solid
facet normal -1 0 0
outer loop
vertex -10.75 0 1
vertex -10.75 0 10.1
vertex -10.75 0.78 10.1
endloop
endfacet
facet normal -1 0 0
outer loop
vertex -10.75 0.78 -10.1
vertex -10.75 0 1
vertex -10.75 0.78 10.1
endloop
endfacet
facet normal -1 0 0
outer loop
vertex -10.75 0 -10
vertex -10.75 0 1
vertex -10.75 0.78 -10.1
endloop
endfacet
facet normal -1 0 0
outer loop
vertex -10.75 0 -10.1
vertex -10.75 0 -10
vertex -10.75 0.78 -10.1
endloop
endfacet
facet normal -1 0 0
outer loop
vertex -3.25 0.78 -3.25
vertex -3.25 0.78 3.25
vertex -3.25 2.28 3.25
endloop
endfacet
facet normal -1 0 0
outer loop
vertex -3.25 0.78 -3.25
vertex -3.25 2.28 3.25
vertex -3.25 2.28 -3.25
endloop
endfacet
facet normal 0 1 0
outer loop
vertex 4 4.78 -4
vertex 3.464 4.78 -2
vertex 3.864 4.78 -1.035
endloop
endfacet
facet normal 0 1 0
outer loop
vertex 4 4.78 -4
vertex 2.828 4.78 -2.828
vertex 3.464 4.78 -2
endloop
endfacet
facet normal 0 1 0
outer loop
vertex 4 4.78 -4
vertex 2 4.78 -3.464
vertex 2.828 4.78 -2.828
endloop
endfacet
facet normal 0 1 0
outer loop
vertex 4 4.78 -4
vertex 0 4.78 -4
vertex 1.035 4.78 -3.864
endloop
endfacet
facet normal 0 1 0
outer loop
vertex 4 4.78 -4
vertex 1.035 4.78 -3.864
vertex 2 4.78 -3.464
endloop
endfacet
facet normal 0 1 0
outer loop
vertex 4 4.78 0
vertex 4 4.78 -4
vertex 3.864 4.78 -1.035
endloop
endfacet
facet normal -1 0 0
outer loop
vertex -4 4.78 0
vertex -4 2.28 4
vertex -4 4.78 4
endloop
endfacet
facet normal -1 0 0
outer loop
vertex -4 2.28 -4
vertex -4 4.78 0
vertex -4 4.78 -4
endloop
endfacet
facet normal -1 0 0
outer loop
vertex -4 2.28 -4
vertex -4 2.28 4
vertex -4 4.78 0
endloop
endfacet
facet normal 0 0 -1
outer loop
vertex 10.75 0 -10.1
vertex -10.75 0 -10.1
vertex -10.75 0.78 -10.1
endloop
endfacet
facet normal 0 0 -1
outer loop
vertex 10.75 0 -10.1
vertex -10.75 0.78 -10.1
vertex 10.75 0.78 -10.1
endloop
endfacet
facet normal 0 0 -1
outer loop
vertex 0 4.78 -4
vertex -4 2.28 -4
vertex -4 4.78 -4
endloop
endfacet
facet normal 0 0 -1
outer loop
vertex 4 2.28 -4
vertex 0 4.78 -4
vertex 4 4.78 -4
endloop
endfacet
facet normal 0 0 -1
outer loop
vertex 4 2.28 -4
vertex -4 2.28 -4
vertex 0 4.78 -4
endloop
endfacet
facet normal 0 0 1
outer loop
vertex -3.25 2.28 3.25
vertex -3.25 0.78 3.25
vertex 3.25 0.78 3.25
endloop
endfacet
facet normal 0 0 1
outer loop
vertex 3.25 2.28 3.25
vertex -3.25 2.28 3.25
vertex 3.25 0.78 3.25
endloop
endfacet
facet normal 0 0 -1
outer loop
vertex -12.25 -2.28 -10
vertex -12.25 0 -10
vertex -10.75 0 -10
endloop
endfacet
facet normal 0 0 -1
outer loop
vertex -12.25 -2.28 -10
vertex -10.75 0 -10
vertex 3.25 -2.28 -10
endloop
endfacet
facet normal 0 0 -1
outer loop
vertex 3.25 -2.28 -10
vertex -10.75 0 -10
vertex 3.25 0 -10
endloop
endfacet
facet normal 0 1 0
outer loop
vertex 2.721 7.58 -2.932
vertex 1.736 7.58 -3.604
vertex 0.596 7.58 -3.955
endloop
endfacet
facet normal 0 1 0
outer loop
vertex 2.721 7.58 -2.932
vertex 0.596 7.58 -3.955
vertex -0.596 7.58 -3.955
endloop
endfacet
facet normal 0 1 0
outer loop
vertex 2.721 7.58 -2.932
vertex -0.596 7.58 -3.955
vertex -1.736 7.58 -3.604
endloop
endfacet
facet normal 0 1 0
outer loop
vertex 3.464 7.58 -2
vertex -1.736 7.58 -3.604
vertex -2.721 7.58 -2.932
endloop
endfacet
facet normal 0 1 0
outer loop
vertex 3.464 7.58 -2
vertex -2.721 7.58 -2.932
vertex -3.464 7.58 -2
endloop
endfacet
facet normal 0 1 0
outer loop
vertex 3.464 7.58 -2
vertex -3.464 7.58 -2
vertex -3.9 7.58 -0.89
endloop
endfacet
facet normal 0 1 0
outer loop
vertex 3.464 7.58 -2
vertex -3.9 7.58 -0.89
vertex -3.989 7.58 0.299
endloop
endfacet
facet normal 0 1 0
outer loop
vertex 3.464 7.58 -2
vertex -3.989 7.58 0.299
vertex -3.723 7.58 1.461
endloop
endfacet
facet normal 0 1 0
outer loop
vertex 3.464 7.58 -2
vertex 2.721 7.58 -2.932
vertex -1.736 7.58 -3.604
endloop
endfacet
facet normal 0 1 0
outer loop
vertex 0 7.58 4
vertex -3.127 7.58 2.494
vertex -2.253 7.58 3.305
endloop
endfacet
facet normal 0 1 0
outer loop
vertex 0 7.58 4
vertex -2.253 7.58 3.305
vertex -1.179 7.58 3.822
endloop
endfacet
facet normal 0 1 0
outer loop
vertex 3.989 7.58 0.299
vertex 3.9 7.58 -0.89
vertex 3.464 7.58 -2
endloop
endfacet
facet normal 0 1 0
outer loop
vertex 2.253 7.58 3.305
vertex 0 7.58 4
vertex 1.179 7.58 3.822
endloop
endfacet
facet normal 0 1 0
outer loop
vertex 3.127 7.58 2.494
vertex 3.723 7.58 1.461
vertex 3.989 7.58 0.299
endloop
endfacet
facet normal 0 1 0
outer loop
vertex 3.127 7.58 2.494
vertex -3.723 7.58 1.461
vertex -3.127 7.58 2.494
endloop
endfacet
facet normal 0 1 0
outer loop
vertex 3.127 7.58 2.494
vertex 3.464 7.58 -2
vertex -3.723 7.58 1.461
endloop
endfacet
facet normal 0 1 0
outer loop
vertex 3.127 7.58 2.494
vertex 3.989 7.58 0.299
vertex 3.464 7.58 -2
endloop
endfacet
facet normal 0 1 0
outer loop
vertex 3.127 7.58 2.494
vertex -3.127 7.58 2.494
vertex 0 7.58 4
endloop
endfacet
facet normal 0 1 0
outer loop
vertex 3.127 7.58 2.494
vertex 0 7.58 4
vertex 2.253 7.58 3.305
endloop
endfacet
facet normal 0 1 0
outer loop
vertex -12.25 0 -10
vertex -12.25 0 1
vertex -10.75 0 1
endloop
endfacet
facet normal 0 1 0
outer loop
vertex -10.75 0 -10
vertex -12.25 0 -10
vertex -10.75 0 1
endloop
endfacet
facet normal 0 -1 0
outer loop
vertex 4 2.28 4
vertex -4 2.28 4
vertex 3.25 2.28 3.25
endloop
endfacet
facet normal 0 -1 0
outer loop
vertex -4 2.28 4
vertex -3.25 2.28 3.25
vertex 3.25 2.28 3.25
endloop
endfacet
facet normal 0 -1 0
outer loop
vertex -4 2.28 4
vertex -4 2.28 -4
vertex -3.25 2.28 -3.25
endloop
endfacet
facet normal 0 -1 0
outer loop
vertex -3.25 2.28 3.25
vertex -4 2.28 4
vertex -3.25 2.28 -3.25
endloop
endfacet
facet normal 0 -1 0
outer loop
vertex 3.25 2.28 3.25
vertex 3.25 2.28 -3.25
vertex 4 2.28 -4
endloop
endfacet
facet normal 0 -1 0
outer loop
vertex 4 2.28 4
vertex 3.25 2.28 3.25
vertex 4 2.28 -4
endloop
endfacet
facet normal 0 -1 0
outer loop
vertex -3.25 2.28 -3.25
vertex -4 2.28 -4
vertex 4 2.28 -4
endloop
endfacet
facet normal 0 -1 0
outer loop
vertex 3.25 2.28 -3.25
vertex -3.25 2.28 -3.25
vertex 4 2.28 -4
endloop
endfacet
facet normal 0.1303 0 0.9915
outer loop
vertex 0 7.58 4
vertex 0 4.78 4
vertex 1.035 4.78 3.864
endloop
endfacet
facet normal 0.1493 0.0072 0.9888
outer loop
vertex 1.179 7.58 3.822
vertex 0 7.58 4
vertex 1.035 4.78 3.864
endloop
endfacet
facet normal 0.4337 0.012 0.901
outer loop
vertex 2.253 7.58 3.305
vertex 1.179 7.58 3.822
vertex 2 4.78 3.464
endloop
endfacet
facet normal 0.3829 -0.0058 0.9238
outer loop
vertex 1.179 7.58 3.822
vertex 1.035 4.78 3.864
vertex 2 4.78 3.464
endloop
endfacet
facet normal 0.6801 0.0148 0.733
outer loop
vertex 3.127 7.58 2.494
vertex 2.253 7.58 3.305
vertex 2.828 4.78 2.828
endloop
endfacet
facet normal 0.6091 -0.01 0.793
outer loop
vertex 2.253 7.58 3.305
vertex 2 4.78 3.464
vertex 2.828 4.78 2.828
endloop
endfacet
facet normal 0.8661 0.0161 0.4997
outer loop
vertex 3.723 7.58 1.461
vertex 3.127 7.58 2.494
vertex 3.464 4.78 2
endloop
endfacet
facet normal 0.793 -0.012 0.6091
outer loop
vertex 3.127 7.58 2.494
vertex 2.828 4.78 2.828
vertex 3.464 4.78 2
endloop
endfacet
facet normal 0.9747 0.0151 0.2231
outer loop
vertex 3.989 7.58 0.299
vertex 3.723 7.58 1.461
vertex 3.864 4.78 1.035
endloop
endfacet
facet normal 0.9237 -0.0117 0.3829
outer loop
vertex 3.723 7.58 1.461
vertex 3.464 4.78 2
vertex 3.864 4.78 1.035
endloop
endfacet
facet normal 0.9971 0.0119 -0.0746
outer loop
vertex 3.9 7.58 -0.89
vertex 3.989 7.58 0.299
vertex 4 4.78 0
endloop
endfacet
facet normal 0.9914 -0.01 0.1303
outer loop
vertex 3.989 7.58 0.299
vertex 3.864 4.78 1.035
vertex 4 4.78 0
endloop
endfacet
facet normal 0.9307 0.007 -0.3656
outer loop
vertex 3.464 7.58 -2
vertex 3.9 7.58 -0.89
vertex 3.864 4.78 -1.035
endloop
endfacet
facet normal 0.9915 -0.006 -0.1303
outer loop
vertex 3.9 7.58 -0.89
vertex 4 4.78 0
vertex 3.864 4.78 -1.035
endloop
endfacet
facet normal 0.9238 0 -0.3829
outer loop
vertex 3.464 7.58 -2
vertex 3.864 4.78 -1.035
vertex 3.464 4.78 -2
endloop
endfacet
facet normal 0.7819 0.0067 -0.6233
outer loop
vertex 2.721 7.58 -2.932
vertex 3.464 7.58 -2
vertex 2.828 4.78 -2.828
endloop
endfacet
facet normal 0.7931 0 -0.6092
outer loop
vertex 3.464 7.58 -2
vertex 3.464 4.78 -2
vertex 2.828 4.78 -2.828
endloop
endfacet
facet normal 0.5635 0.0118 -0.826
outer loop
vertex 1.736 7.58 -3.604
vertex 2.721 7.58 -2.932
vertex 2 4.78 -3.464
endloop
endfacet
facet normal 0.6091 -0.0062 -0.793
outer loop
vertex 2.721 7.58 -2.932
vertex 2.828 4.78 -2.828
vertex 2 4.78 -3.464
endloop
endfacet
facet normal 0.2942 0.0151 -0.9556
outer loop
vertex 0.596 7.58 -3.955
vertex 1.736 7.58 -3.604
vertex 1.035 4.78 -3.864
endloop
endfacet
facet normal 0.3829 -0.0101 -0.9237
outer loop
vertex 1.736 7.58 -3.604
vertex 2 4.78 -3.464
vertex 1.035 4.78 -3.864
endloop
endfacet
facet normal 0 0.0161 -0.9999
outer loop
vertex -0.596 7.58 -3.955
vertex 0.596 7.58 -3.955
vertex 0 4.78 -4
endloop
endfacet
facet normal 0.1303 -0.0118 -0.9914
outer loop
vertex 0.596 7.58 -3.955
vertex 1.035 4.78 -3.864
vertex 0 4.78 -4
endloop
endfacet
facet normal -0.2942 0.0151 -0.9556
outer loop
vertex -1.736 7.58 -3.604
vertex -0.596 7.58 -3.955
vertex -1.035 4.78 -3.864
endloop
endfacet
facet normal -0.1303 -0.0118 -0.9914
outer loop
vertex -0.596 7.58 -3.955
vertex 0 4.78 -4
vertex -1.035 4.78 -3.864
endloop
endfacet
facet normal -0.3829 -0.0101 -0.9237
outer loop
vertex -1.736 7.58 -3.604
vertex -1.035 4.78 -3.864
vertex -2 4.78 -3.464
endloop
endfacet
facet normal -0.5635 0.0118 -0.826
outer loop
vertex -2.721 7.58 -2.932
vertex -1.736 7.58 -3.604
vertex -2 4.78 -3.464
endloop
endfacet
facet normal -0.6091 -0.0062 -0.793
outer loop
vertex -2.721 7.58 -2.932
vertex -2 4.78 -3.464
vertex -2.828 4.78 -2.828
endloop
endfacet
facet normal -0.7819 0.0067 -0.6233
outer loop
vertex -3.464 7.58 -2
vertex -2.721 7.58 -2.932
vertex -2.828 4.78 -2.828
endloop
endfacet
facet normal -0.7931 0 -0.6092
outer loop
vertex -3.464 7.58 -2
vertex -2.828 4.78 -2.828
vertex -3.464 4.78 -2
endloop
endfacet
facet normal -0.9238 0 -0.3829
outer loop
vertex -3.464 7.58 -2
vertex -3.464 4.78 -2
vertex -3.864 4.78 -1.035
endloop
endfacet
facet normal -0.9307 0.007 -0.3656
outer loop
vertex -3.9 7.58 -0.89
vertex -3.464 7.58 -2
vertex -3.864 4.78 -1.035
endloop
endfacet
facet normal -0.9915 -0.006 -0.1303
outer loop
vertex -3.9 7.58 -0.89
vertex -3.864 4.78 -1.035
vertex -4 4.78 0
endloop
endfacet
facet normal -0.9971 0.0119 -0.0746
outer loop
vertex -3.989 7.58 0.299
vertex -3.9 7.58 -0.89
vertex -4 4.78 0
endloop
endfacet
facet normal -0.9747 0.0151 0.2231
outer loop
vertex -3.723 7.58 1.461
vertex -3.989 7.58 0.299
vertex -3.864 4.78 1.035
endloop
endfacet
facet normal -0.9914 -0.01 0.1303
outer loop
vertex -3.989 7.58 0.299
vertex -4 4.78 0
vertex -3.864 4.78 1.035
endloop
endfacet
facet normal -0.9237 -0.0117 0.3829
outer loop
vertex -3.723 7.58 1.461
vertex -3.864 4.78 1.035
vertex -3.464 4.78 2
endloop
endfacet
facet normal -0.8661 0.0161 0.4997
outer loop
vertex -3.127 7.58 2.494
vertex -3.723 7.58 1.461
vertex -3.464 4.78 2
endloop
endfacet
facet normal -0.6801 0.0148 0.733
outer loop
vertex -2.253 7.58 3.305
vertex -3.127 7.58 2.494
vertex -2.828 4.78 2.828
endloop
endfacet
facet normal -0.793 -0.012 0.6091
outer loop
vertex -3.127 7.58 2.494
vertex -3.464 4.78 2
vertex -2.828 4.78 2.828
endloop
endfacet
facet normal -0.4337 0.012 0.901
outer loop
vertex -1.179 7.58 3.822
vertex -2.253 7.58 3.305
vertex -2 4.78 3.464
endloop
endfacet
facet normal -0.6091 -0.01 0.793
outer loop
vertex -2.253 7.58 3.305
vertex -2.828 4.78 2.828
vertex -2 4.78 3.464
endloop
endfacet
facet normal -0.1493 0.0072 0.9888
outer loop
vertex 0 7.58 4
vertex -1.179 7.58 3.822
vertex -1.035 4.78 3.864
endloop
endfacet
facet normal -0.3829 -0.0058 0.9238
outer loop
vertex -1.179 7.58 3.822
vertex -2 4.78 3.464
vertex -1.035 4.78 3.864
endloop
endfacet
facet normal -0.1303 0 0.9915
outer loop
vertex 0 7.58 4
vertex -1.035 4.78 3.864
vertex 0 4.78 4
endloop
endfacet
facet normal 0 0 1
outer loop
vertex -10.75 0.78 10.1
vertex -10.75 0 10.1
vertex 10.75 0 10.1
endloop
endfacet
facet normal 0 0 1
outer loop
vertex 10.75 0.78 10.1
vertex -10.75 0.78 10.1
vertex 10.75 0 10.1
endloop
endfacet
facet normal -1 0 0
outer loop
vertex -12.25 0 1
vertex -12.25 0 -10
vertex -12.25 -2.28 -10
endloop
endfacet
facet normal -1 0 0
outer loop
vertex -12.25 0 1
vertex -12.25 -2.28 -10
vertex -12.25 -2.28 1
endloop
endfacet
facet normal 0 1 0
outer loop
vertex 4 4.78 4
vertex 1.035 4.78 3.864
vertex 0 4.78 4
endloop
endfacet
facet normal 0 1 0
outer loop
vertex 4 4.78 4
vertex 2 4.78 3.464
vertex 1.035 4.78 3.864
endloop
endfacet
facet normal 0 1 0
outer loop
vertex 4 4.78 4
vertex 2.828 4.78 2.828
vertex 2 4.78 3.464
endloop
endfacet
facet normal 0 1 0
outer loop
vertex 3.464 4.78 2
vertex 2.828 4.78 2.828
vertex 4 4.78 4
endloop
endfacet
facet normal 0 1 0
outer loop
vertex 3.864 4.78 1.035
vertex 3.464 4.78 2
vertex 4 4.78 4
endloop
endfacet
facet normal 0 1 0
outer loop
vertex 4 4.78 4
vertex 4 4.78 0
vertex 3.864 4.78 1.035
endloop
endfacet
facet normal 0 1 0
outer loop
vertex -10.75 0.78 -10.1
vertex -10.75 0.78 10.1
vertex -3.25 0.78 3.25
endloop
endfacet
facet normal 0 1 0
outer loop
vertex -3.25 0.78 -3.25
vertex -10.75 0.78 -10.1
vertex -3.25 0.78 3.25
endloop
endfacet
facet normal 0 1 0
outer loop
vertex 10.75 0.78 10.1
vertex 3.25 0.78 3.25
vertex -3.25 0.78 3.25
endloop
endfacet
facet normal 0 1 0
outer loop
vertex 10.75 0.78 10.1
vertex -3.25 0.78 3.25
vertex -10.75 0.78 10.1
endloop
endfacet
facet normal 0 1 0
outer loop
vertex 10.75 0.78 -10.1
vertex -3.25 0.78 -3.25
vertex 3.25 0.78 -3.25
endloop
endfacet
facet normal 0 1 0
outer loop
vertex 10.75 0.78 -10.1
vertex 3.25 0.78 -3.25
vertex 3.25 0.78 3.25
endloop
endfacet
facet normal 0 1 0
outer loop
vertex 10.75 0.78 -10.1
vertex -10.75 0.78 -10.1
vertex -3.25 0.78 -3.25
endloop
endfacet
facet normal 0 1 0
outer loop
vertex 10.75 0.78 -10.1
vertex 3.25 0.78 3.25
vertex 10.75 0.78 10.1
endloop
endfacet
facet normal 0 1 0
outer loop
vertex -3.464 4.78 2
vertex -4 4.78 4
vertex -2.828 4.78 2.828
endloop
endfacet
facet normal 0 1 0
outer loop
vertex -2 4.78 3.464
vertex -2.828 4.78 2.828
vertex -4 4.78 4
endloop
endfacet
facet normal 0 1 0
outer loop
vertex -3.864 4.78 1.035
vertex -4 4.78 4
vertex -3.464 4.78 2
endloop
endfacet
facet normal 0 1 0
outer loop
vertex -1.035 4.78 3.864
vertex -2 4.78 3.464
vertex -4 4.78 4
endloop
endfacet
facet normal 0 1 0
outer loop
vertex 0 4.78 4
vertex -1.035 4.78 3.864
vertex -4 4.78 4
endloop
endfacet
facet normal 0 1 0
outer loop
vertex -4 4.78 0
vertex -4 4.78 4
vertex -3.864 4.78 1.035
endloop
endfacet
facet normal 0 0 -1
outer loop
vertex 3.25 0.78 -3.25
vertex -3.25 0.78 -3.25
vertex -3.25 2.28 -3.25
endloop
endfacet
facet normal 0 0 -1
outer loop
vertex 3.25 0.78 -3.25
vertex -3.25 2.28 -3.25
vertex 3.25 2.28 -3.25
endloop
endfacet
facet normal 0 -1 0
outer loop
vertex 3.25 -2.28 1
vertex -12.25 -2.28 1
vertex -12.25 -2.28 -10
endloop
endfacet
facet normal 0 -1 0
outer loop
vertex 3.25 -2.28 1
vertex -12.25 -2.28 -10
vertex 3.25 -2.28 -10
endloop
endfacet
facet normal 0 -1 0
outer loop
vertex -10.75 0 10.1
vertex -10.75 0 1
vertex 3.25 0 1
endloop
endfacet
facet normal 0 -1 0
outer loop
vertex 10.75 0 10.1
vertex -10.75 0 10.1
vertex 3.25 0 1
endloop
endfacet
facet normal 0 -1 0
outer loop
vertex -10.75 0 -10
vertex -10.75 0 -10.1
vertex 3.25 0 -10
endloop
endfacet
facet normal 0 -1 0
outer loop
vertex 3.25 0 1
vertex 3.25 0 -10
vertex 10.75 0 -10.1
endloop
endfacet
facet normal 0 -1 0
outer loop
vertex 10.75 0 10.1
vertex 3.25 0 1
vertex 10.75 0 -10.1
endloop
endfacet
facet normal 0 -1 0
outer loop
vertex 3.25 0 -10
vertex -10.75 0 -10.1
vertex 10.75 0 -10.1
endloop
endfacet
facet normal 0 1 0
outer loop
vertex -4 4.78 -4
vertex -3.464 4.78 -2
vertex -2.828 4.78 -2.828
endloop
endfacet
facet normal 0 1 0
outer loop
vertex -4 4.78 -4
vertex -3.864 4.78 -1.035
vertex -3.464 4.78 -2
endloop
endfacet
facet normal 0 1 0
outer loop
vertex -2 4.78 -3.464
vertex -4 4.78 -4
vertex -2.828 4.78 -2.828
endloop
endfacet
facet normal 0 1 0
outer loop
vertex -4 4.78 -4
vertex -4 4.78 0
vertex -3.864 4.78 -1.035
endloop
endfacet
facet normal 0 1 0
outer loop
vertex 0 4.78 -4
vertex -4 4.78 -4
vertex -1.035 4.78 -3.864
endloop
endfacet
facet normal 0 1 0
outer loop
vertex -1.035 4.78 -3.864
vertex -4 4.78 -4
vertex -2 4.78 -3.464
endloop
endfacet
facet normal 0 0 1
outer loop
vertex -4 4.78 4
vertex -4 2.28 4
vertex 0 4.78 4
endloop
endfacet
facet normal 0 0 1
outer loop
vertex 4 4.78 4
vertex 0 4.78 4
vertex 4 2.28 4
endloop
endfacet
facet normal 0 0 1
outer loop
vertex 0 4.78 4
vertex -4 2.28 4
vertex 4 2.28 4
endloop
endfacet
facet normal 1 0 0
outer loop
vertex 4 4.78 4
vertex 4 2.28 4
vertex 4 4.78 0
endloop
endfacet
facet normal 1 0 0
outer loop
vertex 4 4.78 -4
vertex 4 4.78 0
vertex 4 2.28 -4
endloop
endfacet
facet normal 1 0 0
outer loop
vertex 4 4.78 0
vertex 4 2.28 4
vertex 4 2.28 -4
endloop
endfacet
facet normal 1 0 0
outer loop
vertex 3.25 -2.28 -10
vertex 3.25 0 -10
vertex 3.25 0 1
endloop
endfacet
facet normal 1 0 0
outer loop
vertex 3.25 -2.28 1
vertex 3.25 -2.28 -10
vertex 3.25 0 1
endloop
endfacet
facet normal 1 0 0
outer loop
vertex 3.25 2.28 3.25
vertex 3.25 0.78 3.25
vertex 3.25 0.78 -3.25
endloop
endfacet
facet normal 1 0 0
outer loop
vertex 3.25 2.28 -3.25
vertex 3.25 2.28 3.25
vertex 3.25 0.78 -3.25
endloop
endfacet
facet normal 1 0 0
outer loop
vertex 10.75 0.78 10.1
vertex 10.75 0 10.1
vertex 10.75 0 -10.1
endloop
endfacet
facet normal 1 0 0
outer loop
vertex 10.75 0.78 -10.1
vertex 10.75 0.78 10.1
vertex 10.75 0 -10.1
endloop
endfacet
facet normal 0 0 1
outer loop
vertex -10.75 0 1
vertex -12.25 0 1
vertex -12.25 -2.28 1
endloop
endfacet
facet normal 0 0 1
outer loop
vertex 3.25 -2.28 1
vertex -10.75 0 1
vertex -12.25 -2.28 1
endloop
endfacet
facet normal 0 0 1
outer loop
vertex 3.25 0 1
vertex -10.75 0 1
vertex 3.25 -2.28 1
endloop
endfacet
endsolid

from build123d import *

# Parameters (mm, degrees)
SKETCH_1_W      = 21.5
SKETCH_1_H      = 20.2
EXTRUDE_1_DEPTH = 0.78
SKETCH_2_W      = 6.5
SKETCH_2_H      = 6.5
EXTRUDE_2_DEPTH = 1.5
SKETCH_3_W      = 8
SKETCH_3_H      = 8
EXTRUDE_3_DEPTH = 2.5
SKETCH_4_R      = 4
EXTRUDE_4_DEPTH = 2.8
SKETCH_5_W      = 15.5
SKETCH_5_H      = 11
EXTRUDE_5_DEPTH = 2.28


with BuildPart() as part:
    # Эскиз1 → Бобышка-Вытянуть1 (new body)
    with BuildSketch(Plane(origin=(0, 0, 0), x_dir=(1, 0, 0), z_dir=(0, 1, 0))):
        Rectangle(SKETCH_1_W, SKETCH_1_H)
    extrude(amount=EXTRUDE_1_DEPTH)

    # Эскиз2 → Бобышка-Вытянуть2 (add)
    with BuildSketch(Plane(origin=(0, 0.78, 0), x_dir=(1, 0, 0), z_dir=(0, 1, 0))):
        Rectangle(SKETCH_2_W, SKETCH_2_H)
    extrude(amount=EXTRUDE_2_DEPTH)

    # Эскиз3 → Бобышка-Вытянуть3 (add)
    with BuildSketch(Plane(origin=(0, 2.28, 0), x_dir=(1, 0, 0), z_dir=(0, 1, 0))):
        Rectangle(SKETCH_3_W, SKETCH_3_H)
    extrude(amount=EXTRUDE_3_DEPTH)

    # Эскиз4 → Бобышка-Вытянуть4 (add)
    with BuildSketch(Plane(origin=(0, 4.78, 0), x_dir=(1, 0, 0), z_dir=(0, 1, 0))):
        with Locations(Location((0, 0, 0), (0, 0, 270))):
            Circle(SKETCH_4_R)
    extrude(amount=EXTRUDE_4_DEPTH)

    # Эскиз5 → Бобышка-Вытянуть5 (add)
    with BuildSketch(Plane.XZ):
        with Locations((-4.5, -4.5)):
            Rectangle(SKETCH_5_W, SKETCH_5_H)
    extrude(amount=EXTRUDE_5_DEPTH)


solid = part.part
